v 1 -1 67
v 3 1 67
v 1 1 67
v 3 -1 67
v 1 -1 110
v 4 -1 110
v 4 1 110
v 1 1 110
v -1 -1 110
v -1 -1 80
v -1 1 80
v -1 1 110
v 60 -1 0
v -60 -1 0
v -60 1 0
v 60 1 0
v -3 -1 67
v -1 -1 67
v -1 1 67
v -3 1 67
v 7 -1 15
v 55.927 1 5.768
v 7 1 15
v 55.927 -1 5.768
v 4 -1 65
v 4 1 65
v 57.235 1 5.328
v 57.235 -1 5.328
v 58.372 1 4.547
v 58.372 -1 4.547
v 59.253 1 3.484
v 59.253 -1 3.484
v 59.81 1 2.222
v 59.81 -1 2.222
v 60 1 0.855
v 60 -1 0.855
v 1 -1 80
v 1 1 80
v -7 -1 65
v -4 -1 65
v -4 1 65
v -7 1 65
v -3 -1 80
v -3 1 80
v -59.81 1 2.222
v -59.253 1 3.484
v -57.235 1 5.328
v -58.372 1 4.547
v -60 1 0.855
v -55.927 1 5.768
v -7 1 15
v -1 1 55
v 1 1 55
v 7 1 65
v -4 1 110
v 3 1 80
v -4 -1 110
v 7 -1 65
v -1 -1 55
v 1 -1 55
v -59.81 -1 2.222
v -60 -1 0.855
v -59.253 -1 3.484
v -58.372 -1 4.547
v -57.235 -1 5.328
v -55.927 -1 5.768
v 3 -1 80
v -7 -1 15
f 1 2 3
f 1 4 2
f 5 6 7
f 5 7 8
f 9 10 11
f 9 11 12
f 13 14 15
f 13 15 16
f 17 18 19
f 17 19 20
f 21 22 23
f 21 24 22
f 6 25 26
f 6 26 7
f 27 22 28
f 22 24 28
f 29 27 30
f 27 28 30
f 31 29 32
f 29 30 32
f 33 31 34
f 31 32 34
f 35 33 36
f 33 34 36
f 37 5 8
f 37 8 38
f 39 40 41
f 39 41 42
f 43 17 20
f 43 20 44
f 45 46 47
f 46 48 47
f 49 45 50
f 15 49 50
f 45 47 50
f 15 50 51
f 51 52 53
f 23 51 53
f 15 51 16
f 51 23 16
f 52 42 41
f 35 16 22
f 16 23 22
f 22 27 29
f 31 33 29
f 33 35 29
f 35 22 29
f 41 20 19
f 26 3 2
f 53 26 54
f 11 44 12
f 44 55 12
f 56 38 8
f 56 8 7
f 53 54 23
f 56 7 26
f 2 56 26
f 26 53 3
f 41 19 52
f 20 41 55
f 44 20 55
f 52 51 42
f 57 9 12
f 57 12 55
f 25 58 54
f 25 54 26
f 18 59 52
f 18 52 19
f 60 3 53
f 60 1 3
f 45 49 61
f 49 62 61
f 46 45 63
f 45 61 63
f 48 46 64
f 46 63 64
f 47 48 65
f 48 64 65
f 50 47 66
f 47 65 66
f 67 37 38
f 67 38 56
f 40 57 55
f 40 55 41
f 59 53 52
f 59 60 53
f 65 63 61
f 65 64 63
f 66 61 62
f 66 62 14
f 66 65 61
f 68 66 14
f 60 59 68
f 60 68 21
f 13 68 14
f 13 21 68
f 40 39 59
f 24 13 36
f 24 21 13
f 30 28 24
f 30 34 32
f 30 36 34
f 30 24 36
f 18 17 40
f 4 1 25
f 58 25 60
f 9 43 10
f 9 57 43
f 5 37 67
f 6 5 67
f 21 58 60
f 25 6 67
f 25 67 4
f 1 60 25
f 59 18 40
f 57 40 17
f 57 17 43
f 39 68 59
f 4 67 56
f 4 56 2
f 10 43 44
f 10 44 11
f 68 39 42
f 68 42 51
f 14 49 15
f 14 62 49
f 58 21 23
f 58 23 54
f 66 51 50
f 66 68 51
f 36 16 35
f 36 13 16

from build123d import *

# Parameters (mm, degrees)
F1_DEPTH      = 1
F1_DEPTH_BACK = 1
F2_R          = 5


with BuildPart() as f1:
    # F0 (on Front) → F1 (new body, two sides)
    with BuildSketch(Plane.XZ) as f1_sk:
        Polygon((1, 55), (-1, 55), (-1, 67), (-3, 67), (-3, 80), (-1, 80), (-1, 110), (-4, 110), (-4, 65), (-7, 65), (-7, 15), (-60, 4.999998), (-60, 0), (60, 0), (60, 5), (7, 15), (7, 65), (4, 65), (4, 110), (1, 110), (1, 80), (3, 80), (3, 67), (1, 67), align=None)
    extrude(amount=F1_DEPTH)
    extrude(f1_sk.sketch, amount=-F1_DEPTH_BACK)

    # F2
    f2_edges = [f1.edges().sort_by_distance(p)[0] for p in [
        (-60, 0, 4.999998),
        (60, 0, 5),
    ]]
    fillet(f2_edges, radius=F2_R)


solid = f1.part
